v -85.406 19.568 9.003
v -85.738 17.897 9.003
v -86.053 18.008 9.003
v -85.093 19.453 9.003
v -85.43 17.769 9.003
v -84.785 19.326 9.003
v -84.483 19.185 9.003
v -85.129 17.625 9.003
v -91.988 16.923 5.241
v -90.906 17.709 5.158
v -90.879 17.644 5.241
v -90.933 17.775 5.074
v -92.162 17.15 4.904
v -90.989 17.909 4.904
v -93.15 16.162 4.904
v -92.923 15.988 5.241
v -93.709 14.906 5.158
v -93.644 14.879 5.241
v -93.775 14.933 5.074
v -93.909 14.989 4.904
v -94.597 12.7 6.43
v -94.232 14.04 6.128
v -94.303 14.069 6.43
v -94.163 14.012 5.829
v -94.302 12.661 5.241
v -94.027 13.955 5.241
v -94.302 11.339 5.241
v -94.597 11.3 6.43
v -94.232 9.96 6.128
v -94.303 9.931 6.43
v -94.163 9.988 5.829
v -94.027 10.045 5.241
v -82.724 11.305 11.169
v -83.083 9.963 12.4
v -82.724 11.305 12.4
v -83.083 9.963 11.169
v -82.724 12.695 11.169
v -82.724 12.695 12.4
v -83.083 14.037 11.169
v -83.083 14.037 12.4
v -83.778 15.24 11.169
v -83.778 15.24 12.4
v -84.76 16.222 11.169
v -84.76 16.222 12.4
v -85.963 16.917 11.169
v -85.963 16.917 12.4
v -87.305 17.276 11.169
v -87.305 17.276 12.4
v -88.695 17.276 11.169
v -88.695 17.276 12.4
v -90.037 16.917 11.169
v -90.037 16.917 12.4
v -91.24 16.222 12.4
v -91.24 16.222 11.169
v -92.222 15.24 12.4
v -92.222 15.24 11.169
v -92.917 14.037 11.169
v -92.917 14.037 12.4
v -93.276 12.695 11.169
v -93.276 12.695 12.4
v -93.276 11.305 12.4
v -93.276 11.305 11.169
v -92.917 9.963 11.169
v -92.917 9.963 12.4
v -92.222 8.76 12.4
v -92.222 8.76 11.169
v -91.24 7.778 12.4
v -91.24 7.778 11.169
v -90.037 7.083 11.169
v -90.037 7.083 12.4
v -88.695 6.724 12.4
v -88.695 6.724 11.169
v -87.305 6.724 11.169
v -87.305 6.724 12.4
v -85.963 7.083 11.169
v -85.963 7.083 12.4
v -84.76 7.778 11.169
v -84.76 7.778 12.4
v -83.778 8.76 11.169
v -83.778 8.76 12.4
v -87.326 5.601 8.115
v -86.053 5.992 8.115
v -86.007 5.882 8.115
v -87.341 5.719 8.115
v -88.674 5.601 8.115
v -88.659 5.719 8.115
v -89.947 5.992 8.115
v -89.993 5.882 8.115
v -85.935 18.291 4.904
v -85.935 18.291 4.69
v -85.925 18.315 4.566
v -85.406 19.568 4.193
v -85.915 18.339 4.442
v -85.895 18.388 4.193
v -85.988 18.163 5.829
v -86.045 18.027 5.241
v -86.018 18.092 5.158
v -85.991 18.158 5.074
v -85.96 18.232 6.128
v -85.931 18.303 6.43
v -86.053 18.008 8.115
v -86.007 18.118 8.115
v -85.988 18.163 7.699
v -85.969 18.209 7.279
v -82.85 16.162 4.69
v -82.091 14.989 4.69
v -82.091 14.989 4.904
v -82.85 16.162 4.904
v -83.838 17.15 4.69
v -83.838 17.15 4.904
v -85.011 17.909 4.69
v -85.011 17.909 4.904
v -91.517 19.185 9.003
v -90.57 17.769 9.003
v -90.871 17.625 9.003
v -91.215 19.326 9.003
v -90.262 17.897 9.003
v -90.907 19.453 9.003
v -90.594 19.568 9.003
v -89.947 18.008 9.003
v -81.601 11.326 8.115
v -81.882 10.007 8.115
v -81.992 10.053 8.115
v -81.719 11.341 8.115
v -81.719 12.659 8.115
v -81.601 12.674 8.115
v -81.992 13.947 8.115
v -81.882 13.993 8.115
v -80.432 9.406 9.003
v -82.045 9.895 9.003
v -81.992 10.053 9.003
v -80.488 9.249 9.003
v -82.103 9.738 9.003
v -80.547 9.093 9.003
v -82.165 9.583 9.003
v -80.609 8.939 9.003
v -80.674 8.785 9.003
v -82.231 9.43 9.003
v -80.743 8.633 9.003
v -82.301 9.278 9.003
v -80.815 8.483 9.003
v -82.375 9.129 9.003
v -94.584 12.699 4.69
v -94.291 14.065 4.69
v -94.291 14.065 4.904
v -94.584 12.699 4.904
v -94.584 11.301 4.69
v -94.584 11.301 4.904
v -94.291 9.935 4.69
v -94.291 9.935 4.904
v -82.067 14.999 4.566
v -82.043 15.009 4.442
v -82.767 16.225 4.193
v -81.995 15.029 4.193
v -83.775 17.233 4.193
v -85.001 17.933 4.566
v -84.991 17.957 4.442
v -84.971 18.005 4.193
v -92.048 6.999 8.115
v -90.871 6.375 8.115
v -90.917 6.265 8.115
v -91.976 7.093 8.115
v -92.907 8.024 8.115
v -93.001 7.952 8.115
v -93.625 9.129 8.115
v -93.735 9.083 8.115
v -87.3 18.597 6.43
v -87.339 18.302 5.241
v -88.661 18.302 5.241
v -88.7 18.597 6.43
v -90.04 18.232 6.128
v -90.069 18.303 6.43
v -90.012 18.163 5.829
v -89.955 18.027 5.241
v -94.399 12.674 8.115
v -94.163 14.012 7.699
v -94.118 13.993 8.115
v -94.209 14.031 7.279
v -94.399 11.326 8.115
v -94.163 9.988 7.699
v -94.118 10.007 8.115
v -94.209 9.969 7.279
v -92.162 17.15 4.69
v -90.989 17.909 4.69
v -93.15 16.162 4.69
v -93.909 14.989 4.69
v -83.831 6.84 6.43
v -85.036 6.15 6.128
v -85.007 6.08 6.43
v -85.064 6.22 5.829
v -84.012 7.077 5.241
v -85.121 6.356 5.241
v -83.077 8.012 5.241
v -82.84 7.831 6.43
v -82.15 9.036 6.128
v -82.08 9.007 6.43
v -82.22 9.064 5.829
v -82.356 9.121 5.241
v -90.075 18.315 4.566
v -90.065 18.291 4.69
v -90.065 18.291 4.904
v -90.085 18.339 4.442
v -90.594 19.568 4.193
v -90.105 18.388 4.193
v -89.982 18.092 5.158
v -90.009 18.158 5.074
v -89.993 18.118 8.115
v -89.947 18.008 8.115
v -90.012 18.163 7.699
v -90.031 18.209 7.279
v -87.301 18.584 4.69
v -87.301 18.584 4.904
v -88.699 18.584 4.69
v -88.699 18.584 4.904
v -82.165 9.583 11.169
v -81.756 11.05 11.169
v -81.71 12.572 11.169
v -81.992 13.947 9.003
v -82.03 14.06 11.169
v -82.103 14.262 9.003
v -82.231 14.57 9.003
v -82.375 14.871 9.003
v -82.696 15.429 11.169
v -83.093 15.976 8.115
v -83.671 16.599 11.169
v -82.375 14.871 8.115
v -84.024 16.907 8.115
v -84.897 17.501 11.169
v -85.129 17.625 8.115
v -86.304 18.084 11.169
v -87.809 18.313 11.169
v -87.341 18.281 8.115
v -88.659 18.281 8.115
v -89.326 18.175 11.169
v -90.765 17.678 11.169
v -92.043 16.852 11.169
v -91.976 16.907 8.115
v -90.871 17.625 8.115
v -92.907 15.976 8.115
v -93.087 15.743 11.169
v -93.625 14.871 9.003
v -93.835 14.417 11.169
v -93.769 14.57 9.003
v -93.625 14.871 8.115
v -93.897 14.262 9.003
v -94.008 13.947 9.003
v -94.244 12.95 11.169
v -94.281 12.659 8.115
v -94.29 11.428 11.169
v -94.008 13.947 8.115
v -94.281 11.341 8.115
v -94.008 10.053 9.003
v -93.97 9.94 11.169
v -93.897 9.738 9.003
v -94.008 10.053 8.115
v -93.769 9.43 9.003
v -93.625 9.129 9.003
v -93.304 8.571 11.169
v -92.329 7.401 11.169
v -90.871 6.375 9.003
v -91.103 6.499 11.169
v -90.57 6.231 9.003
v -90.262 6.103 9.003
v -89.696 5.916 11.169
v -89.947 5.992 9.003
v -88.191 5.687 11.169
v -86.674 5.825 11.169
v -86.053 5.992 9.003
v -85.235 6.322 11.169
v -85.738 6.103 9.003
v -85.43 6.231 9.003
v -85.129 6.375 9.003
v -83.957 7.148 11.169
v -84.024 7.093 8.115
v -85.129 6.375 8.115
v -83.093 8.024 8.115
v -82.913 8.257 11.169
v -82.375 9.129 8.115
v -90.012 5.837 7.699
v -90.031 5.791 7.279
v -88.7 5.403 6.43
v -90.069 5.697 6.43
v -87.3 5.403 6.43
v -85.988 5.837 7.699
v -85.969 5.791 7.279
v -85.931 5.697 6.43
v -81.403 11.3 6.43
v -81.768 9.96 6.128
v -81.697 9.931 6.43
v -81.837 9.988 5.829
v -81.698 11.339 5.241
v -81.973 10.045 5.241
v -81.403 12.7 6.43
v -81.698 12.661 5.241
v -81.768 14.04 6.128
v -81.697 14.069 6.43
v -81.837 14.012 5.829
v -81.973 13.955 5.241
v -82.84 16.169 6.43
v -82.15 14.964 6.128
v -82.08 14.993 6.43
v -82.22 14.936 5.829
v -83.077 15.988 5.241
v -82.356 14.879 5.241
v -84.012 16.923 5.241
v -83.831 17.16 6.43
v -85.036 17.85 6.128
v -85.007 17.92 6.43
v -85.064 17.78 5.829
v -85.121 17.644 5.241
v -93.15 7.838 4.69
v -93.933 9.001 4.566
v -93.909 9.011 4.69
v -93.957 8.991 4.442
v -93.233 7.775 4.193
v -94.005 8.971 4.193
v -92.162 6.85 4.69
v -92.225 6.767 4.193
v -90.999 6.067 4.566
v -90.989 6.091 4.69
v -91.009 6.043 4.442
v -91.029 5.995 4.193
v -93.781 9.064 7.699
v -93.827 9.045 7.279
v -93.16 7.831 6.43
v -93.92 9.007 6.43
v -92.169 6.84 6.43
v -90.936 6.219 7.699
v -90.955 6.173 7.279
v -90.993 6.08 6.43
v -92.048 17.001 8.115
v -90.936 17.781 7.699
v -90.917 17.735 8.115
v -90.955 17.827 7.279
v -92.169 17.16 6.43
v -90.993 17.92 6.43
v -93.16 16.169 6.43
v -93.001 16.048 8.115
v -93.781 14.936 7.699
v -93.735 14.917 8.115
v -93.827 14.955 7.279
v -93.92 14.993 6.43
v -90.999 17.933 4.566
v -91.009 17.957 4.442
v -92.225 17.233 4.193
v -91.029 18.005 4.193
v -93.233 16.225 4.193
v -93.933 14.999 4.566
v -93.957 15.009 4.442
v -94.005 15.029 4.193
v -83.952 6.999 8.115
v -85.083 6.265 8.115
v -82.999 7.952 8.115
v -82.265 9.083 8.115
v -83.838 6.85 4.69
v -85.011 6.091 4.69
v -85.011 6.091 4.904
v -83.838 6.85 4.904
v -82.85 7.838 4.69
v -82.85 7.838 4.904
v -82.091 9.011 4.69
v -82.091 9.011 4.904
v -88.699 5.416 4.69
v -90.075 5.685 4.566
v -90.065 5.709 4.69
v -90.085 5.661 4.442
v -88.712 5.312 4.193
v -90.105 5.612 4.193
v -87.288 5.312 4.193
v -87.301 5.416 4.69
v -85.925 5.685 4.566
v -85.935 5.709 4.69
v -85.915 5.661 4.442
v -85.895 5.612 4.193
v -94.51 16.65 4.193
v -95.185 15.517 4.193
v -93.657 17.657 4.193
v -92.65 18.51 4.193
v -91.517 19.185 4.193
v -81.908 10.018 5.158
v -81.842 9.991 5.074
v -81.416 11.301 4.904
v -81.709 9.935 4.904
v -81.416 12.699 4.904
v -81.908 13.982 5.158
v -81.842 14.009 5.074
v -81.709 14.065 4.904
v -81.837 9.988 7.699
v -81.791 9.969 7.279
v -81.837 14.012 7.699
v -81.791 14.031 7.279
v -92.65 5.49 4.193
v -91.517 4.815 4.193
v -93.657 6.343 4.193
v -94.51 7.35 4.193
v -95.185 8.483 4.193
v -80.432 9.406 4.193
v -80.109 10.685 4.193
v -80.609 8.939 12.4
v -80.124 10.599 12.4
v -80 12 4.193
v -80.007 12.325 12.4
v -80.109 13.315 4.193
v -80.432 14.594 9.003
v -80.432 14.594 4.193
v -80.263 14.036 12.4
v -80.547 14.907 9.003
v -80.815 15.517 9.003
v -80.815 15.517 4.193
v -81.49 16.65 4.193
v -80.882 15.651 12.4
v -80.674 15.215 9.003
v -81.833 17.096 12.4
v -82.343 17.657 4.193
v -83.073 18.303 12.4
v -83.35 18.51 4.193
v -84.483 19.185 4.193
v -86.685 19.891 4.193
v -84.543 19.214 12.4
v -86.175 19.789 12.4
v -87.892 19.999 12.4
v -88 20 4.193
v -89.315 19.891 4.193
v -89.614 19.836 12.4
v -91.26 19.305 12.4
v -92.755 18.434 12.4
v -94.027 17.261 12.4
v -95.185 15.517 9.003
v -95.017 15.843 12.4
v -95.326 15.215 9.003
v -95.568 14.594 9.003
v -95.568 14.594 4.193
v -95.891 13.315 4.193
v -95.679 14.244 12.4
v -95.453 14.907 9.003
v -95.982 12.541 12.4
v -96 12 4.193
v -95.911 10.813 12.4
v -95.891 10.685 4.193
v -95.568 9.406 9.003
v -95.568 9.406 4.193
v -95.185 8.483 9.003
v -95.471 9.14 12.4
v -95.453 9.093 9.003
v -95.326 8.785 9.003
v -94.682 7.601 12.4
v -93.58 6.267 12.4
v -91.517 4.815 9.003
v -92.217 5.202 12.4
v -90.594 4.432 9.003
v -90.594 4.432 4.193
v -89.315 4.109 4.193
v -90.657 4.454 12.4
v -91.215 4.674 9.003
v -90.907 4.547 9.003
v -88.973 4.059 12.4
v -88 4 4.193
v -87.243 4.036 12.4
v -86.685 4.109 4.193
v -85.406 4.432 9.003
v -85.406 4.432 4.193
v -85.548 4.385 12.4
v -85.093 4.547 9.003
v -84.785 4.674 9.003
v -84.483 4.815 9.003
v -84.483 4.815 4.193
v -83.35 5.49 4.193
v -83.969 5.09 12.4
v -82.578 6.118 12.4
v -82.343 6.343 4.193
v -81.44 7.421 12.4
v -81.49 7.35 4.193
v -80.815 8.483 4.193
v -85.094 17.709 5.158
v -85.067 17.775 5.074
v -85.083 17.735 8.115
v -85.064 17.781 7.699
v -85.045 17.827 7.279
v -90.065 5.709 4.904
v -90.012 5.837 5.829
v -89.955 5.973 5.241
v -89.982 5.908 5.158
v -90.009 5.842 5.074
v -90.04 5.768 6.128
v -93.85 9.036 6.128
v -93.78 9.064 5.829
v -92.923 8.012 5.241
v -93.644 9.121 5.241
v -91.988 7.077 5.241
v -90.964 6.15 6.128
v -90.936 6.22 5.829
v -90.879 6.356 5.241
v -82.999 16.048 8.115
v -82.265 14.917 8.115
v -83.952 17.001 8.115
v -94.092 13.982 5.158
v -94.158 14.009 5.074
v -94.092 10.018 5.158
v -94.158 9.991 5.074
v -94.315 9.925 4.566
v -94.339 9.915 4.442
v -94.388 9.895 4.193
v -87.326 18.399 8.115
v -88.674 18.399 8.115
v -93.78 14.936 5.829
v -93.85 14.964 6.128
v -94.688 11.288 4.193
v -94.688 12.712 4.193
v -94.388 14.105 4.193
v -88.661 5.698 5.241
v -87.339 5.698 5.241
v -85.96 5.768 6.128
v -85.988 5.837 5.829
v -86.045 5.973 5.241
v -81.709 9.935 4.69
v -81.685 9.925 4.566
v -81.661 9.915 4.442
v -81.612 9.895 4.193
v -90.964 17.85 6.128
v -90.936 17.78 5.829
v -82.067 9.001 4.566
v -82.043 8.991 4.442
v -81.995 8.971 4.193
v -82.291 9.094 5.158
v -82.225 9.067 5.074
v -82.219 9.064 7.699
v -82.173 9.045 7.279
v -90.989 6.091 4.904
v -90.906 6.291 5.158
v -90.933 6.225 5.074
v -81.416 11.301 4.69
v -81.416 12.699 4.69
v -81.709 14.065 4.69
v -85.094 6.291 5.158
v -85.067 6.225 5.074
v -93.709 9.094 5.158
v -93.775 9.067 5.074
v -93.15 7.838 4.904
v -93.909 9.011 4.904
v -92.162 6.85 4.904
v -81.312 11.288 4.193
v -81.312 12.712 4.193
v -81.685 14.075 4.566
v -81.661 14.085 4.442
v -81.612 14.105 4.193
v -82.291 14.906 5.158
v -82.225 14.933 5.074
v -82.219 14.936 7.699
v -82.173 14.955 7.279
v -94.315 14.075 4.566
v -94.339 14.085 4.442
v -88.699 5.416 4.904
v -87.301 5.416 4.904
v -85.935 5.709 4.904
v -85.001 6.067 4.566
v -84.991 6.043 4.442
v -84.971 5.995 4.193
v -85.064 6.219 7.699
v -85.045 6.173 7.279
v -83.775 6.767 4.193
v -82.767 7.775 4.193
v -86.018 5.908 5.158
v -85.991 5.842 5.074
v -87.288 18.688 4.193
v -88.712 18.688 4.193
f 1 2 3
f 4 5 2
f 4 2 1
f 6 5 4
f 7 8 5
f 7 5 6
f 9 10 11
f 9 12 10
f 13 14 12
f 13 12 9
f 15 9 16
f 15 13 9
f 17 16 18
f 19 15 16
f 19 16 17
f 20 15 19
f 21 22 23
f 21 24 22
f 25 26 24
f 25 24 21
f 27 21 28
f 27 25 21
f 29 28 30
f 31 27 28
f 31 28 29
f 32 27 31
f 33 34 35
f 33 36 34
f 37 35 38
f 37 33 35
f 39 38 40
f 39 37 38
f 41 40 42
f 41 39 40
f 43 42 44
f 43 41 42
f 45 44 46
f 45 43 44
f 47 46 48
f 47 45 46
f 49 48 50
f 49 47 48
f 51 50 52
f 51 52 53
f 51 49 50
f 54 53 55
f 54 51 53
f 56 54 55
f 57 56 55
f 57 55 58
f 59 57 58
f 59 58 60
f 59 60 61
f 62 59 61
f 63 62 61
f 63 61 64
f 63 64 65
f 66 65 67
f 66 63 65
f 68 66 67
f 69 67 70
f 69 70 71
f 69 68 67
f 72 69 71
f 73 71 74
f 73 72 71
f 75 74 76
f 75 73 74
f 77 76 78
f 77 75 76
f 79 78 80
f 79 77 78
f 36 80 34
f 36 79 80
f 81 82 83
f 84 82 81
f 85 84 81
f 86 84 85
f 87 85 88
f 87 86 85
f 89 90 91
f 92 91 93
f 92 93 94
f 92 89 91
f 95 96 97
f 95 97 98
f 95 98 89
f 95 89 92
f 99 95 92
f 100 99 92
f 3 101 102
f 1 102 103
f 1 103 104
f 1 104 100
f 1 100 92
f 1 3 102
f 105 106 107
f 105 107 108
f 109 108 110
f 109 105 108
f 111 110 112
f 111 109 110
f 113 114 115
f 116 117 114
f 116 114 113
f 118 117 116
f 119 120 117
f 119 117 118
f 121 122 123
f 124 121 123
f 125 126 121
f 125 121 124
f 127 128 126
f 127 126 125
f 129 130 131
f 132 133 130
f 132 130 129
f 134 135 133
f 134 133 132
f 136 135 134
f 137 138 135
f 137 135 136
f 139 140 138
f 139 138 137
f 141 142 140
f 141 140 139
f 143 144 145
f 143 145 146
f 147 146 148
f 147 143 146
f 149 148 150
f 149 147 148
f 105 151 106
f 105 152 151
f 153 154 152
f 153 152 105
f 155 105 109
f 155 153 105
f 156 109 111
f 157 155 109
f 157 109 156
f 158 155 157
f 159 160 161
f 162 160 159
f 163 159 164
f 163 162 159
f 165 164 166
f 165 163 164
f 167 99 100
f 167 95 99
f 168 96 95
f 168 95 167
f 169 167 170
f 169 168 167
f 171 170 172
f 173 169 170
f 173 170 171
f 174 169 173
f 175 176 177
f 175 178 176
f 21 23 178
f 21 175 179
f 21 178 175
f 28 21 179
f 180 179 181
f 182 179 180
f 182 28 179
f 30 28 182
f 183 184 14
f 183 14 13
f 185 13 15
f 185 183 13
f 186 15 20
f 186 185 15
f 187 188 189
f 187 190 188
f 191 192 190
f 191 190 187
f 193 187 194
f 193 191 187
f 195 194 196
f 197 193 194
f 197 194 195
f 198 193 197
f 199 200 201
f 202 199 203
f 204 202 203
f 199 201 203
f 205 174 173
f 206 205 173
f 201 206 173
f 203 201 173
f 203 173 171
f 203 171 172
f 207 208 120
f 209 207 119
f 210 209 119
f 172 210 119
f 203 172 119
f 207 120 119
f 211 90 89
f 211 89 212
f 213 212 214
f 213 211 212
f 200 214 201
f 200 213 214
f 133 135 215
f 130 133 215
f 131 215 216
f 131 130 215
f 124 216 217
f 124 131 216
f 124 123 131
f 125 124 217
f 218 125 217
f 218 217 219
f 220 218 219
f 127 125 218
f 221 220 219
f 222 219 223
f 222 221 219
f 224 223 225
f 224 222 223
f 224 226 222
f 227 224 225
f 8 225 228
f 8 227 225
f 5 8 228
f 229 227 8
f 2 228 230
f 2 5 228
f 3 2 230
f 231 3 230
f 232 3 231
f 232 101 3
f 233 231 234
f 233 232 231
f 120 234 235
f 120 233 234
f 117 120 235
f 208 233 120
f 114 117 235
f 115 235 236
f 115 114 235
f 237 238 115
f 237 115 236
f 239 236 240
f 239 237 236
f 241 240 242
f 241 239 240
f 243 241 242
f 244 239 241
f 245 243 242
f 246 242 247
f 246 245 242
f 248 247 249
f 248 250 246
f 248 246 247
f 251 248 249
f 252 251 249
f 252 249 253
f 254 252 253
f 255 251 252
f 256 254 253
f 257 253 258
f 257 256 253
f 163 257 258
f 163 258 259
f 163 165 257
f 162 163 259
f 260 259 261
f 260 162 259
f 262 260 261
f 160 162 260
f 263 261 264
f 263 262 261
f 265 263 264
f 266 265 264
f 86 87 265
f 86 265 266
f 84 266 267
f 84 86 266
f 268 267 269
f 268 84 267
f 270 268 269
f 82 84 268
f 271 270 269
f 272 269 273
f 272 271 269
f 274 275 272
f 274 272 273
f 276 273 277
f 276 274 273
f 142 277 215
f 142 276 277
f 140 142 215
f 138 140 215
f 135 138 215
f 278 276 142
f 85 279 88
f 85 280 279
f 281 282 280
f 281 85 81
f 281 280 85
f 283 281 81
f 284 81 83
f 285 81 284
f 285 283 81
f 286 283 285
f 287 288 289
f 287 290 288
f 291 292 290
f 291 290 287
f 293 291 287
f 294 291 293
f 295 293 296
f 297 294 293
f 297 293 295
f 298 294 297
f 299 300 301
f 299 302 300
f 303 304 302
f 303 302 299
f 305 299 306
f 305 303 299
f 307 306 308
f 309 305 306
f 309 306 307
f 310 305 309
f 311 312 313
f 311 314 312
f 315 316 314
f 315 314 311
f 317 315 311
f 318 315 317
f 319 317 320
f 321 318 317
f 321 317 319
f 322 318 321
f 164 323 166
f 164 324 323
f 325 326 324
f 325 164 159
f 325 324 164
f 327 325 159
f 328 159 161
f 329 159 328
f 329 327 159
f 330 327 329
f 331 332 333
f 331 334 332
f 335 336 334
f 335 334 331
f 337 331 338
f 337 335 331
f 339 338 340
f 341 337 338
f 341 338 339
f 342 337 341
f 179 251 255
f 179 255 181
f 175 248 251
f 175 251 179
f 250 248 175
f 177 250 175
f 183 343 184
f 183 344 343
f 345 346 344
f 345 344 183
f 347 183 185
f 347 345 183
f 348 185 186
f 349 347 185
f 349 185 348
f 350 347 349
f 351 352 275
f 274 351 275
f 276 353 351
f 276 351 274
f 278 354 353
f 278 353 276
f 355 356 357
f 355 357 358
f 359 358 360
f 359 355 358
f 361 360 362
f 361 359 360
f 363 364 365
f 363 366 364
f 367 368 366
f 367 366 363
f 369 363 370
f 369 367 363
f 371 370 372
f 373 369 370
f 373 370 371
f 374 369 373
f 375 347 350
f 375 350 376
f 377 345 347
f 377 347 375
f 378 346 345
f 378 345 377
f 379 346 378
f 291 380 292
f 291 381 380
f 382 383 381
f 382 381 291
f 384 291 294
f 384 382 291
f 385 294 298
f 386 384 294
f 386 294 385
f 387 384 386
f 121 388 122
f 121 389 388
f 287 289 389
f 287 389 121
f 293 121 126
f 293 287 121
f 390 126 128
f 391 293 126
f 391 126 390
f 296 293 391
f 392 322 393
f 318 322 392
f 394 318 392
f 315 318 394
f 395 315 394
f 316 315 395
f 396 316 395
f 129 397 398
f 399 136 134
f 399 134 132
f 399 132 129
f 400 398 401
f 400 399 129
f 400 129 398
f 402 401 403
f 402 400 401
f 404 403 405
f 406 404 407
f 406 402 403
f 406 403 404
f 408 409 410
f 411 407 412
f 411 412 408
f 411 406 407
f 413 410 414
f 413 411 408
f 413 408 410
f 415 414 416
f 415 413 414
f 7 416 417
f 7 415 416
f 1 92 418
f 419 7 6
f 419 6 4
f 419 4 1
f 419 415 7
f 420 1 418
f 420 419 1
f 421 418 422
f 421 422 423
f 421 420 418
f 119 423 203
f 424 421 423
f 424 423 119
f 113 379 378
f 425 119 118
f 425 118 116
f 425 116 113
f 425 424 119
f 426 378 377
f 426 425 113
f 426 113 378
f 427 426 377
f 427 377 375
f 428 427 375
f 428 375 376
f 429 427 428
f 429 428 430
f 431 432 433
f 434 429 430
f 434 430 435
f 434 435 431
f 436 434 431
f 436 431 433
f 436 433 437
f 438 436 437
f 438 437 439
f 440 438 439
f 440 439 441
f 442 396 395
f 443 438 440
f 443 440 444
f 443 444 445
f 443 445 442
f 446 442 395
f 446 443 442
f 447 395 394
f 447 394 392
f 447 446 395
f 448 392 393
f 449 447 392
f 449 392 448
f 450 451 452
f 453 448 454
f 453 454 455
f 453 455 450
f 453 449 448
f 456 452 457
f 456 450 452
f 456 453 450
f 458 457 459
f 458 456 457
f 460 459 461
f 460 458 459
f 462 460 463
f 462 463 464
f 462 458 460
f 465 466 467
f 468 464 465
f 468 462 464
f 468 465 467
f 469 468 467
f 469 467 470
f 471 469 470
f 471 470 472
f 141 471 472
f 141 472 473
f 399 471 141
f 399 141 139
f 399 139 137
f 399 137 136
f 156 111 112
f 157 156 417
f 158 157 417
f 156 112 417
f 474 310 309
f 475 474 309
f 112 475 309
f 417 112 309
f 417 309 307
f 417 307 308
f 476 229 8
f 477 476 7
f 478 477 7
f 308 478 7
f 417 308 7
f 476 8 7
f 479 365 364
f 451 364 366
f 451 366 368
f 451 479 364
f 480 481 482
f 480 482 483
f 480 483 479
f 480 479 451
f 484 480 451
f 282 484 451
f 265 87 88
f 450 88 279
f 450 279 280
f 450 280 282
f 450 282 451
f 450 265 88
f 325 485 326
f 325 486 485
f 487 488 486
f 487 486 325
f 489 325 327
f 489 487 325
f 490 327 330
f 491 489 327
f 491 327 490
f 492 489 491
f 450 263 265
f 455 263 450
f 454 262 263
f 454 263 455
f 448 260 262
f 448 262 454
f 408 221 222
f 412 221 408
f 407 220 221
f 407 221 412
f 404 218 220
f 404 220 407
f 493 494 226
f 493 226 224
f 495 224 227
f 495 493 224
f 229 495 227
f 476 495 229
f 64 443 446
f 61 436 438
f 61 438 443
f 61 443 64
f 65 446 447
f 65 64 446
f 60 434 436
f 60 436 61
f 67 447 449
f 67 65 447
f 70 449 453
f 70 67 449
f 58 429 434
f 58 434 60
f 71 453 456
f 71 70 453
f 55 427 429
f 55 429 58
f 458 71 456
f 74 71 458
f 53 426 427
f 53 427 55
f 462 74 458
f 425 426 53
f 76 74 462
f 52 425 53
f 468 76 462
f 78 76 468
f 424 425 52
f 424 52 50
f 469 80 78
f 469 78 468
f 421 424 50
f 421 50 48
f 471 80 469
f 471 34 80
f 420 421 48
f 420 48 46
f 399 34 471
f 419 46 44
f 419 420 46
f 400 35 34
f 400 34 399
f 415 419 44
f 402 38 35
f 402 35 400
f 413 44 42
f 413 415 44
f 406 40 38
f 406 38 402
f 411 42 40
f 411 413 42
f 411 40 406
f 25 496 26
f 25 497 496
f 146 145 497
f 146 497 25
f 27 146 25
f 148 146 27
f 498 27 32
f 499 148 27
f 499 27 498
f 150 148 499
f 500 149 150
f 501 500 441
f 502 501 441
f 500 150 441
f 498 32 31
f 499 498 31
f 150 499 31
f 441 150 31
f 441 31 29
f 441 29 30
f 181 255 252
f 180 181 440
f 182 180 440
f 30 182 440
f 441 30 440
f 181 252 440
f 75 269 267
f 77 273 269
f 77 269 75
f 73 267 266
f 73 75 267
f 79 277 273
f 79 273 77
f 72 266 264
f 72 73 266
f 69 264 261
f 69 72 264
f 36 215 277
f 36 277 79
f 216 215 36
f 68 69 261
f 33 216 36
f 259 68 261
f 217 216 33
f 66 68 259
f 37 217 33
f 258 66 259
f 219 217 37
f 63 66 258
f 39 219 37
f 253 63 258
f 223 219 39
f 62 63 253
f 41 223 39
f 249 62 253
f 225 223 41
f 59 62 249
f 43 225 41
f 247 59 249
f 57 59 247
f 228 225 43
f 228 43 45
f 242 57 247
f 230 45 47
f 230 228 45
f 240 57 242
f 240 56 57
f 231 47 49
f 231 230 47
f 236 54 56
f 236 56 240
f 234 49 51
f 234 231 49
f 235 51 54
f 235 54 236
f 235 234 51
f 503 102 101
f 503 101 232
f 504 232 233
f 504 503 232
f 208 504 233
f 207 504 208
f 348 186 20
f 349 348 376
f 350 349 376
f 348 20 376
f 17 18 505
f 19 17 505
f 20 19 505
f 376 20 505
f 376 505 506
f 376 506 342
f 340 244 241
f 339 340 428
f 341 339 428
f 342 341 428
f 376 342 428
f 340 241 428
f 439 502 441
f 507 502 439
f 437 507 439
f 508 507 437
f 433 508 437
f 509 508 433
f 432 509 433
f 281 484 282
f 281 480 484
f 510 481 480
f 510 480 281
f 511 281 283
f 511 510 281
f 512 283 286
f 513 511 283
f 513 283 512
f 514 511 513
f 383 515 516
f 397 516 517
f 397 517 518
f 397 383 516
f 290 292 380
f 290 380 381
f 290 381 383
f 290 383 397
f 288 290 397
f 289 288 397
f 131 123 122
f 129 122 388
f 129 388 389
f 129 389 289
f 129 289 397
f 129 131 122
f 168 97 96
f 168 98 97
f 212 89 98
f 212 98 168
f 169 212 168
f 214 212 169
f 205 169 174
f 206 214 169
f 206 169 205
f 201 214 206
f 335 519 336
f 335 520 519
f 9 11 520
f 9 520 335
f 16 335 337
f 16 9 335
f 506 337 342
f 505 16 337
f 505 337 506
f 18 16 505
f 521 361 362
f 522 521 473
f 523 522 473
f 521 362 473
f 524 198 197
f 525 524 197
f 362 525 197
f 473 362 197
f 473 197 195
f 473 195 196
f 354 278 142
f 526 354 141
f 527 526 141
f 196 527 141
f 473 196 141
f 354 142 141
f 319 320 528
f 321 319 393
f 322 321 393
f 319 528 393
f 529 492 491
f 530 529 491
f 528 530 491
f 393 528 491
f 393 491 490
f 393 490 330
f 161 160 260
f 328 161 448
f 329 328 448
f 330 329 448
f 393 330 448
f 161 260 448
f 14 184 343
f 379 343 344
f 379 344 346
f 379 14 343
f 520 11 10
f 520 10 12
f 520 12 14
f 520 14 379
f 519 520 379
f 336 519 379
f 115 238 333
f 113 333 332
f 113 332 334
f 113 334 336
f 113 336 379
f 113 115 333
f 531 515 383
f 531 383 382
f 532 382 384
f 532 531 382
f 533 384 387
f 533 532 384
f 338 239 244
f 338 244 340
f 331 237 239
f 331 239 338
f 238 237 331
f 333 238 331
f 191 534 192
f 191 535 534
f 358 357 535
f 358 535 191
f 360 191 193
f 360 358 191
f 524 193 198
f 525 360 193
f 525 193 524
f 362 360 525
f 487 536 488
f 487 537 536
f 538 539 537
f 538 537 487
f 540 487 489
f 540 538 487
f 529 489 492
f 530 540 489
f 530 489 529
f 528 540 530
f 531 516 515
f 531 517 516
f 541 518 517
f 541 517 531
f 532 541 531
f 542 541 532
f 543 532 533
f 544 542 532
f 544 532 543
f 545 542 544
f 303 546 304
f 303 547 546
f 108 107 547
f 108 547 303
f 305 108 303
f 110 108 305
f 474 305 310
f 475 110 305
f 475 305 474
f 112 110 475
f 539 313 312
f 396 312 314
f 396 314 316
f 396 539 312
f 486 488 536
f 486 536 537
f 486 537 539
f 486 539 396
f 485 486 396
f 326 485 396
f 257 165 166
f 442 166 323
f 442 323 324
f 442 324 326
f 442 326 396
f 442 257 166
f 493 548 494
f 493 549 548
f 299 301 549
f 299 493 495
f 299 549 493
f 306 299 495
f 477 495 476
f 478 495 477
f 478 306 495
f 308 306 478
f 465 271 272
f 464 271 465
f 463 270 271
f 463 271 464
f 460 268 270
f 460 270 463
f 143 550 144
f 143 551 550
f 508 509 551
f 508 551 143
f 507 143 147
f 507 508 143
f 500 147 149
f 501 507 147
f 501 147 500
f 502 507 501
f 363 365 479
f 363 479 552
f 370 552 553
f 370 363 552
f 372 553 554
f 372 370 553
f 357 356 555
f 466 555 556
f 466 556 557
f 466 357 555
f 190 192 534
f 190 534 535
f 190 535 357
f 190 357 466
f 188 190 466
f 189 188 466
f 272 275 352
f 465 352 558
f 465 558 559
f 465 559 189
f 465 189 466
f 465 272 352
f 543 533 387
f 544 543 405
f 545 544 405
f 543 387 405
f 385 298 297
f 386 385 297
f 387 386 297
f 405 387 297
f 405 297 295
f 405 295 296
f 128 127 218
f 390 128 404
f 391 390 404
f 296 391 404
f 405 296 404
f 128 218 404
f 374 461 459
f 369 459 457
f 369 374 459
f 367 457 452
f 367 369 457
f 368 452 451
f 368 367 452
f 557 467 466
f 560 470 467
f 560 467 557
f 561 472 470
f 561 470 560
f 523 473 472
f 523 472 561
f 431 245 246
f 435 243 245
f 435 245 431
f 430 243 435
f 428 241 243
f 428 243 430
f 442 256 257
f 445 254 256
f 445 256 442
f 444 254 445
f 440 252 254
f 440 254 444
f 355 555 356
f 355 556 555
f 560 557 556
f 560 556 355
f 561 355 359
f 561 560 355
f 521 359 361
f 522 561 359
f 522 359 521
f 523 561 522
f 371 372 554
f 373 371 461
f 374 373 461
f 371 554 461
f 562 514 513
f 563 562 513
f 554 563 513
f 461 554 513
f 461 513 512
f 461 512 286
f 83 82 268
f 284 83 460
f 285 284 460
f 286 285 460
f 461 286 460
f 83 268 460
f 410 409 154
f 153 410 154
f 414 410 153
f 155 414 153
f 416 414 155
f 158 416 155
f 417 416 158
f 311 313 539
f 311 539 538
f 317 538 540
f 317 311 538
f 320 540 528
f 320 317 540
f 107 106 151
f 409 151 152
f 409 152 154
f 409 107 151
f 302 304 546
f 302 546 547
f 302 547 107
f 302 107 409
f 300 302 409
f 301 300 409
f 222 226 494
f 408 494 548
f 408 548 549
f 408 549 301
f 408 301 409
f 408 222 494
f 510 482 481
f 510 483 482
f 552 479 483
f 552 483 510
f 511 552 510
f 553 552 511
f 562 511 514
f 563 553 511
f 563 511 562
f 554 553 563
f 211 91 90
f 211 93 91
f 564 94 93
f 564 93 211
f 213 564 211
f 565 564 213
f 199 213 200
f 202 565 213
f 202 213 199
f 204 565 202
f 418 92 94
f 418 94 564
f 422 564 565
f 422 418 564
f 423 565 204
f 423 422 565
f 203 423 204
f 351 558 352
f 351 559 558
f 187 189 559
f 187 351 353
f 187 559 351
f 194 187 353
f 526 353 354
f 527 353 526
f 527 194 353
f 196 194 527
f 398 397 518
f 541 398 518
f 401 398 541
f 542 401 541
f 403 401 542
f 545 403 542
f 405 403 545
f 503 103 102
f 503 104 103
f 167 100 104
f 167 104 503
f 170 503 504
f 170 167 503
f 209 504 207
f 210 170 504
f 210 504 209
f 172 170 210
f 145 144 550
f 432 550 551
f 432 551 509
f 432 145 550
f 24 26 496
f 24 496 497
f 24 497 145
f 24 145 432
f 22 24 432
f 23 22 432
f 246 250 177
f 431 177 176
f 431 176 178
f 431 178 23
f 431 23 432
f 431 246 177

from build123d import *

# Parameters (mm, degrees)
SKETCH073_W             = 2.501097
SKETCH073_H             = 5.003426
POCKET017_DEPTH         = 0.5
POLARPATTERN_COUNT      = 8
BODY016_PLACEMENT_ANGLE = 22.5


with BuildPart() as part:
    # Sketch072 → Revolution005 (revolve)
    with BuildSketch(Plane.XZ):
        Polygon((5.321734, 8.4), (5.321734, 7.168998), (6.315841, 7.168998), (6.315841, 4.11532), (6.434004, 4.11532), (6.633604, 2.430329), (6.336122, 1.240818), (6.621345, 0.904052), (6.621345, 0.689515), (6.725548, 0.193016), (8, 0.193016), (8, 8.4), align=None)
    revolve(axis=Axis((0, 0, 0), (0, 0, 1)))

    # Sketch073 → Pocket017 (cut, symmetric)
    with BuildSketch(Plane.XZ):
        with Locations((7.439441, 2.501713)):
            Rectangle(SKETCH073_W, SKETCH073_H)
    pocket017 = extrude(amount=POCKET017_DEPTH, both=True, mode=Mode.SUBTRACT)

    # PolarPattern: Pocket017 ×8 about axis
    polarpattern_axis = Axis((0, 0, 0), (0, 0, 1))
    for i in range(1, POLARPATTERN_COUNT):
        add(pocket017.rotate(polarpattern_axis, i * 360 / POLARPATTERN_COUNT), mode=Mode.SUBTRACT)


with BuildPart() as part_1:
    # Body016 placement: moved
    add(part.part.moved(Location((-88, 12, 4))).rotate(Axis((-88, 12, 4), (0, 0, -1)), BODY016_PLACEMENT_ANGLE))


solid = part_1.part
